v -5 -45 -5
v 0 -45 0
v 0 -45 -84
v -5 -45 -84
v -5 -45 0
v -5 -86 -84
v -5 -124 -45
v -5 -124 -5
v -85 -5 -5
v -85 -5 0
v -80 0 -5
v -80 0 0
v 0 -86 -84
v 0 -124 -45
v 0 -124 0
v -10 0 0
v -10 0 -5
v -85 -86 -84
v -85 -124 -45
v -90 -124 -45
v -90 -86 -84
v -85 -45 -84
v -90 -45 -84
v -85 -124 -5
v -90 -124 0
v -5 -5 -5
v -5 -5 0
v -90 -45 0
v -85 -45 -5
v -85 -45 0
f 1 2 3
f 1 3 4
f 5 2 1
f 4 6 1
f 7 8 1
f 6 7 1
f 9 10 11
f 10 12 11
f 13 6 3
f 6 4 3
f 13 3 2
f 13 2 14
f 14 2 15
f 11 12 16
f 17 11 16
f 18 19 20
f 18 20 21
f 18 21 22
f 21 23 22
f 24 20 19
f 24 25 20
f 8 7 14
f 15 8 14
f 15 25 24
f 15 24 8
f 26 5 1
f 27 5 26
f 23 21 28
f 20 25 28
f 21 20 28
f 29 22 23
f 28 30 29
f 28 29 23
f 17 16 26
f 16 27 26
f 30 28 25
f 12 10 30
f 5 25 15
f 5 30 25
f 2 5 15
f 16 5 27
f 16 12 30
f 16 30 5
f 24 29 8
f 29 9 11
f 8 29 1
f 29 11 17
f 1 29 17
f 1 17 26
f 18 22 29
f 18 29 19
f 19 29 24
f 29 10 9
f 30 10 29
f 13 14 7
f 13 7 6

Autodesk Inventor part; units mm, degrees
ref_plane "YZ Plane" through (0, 0, 0) normal (1, 0, 0) x (0, 1, 0)
ref_plane "XZ Plane" through (0, 0, 0) normal (0, 1, 0) x (-1, 0, 0)
ref_plane "XY Plane" through (0, 0, 0) normal (0, 0, 1) x (1, 0, 0)
sketch "Sketch1" plane through (0, 0, 0) normal (0, 0, 1) x (1, 0, 0)
  line L0 (-5, -45) -> (-5, 0)
  line L1 (-85, 0) -> (-5, 0)
  line L2 (-85, 0) -> (-85, -45)
  line L3 (-85, 0) -> (-5, 0)
  line L4 (-5, 0) -> (-5, -45)
  line L5 (-85, -45) -> (-85, 0)
  line L6 (-85, -45) -> (-85, -124)
  line L7 (-85, -124) -> (-5, -124)
  line L8 (-5, -124) -> (-5, -45)
  point P0 (0, 0)
  dimension "d5" = 124
extrude "Extrusion1" add sketch "Sketch1" against normal blind 5
chamfer "Chamfer1" distance 5 angle 45 2 edges at (-5, 0, -2.5) (-85, 0, -2.5)
sketch "Sketch2" plane through (0, 0, 0) normal (0, 0, 1) x (1, 0, 0)
  line L0 (-85, -5) -> (-85, -124) projected
  line L1 (-85, -124) -> (-5, -124) projected
  line L2 (-5, -124) -> (-5, -5) projected
  line L3 (0, -45) -> (-5, -45)
  line L4 (0, -45) -> (0, 5)
  line L5 (-85, -45) -> (-90, -45)
  line L6 (-90, -45) -> (-90, 5)
  line L7 (-85, -124) -> (-90, -124)
  line L8 (-90, -124) -> (-90, -45)
  line L9 (-90, -45) -> (-85, -45)
  line L10 (-85, -45) -> (-85, -124)
  line L11 (-5, -45) -> (0, -45)
  line L12 (0, -45) -> (0, -124)
  line L13 (0, -124) -> (-5, -124)
  line L14 (-5, -124) -> (-5, -45)
  point P0 (0, 0)
  dimension "d6" = 5
extrude "Extrusion2" add sketch "Sketch2" against normal blind 84
sketch "Sketch3" plane through (0, -124, 0) normal (1, 0, 0) x (0, 0, -1)
  line L0 (84, 0) -> (84, 79) projected
  line L1 (0, 0) -> (84, 0) projected
  line L2 (45, 0) -> (84, 38)
  point P0 (0, 124)
  dimension "d9" = 45
  dimension "d10" = 38
extrude "Extrusion3" cut sketch "Sketch3" against normal through all
properties part number "ADSK-MH-10045" material "Steel, Mild"
